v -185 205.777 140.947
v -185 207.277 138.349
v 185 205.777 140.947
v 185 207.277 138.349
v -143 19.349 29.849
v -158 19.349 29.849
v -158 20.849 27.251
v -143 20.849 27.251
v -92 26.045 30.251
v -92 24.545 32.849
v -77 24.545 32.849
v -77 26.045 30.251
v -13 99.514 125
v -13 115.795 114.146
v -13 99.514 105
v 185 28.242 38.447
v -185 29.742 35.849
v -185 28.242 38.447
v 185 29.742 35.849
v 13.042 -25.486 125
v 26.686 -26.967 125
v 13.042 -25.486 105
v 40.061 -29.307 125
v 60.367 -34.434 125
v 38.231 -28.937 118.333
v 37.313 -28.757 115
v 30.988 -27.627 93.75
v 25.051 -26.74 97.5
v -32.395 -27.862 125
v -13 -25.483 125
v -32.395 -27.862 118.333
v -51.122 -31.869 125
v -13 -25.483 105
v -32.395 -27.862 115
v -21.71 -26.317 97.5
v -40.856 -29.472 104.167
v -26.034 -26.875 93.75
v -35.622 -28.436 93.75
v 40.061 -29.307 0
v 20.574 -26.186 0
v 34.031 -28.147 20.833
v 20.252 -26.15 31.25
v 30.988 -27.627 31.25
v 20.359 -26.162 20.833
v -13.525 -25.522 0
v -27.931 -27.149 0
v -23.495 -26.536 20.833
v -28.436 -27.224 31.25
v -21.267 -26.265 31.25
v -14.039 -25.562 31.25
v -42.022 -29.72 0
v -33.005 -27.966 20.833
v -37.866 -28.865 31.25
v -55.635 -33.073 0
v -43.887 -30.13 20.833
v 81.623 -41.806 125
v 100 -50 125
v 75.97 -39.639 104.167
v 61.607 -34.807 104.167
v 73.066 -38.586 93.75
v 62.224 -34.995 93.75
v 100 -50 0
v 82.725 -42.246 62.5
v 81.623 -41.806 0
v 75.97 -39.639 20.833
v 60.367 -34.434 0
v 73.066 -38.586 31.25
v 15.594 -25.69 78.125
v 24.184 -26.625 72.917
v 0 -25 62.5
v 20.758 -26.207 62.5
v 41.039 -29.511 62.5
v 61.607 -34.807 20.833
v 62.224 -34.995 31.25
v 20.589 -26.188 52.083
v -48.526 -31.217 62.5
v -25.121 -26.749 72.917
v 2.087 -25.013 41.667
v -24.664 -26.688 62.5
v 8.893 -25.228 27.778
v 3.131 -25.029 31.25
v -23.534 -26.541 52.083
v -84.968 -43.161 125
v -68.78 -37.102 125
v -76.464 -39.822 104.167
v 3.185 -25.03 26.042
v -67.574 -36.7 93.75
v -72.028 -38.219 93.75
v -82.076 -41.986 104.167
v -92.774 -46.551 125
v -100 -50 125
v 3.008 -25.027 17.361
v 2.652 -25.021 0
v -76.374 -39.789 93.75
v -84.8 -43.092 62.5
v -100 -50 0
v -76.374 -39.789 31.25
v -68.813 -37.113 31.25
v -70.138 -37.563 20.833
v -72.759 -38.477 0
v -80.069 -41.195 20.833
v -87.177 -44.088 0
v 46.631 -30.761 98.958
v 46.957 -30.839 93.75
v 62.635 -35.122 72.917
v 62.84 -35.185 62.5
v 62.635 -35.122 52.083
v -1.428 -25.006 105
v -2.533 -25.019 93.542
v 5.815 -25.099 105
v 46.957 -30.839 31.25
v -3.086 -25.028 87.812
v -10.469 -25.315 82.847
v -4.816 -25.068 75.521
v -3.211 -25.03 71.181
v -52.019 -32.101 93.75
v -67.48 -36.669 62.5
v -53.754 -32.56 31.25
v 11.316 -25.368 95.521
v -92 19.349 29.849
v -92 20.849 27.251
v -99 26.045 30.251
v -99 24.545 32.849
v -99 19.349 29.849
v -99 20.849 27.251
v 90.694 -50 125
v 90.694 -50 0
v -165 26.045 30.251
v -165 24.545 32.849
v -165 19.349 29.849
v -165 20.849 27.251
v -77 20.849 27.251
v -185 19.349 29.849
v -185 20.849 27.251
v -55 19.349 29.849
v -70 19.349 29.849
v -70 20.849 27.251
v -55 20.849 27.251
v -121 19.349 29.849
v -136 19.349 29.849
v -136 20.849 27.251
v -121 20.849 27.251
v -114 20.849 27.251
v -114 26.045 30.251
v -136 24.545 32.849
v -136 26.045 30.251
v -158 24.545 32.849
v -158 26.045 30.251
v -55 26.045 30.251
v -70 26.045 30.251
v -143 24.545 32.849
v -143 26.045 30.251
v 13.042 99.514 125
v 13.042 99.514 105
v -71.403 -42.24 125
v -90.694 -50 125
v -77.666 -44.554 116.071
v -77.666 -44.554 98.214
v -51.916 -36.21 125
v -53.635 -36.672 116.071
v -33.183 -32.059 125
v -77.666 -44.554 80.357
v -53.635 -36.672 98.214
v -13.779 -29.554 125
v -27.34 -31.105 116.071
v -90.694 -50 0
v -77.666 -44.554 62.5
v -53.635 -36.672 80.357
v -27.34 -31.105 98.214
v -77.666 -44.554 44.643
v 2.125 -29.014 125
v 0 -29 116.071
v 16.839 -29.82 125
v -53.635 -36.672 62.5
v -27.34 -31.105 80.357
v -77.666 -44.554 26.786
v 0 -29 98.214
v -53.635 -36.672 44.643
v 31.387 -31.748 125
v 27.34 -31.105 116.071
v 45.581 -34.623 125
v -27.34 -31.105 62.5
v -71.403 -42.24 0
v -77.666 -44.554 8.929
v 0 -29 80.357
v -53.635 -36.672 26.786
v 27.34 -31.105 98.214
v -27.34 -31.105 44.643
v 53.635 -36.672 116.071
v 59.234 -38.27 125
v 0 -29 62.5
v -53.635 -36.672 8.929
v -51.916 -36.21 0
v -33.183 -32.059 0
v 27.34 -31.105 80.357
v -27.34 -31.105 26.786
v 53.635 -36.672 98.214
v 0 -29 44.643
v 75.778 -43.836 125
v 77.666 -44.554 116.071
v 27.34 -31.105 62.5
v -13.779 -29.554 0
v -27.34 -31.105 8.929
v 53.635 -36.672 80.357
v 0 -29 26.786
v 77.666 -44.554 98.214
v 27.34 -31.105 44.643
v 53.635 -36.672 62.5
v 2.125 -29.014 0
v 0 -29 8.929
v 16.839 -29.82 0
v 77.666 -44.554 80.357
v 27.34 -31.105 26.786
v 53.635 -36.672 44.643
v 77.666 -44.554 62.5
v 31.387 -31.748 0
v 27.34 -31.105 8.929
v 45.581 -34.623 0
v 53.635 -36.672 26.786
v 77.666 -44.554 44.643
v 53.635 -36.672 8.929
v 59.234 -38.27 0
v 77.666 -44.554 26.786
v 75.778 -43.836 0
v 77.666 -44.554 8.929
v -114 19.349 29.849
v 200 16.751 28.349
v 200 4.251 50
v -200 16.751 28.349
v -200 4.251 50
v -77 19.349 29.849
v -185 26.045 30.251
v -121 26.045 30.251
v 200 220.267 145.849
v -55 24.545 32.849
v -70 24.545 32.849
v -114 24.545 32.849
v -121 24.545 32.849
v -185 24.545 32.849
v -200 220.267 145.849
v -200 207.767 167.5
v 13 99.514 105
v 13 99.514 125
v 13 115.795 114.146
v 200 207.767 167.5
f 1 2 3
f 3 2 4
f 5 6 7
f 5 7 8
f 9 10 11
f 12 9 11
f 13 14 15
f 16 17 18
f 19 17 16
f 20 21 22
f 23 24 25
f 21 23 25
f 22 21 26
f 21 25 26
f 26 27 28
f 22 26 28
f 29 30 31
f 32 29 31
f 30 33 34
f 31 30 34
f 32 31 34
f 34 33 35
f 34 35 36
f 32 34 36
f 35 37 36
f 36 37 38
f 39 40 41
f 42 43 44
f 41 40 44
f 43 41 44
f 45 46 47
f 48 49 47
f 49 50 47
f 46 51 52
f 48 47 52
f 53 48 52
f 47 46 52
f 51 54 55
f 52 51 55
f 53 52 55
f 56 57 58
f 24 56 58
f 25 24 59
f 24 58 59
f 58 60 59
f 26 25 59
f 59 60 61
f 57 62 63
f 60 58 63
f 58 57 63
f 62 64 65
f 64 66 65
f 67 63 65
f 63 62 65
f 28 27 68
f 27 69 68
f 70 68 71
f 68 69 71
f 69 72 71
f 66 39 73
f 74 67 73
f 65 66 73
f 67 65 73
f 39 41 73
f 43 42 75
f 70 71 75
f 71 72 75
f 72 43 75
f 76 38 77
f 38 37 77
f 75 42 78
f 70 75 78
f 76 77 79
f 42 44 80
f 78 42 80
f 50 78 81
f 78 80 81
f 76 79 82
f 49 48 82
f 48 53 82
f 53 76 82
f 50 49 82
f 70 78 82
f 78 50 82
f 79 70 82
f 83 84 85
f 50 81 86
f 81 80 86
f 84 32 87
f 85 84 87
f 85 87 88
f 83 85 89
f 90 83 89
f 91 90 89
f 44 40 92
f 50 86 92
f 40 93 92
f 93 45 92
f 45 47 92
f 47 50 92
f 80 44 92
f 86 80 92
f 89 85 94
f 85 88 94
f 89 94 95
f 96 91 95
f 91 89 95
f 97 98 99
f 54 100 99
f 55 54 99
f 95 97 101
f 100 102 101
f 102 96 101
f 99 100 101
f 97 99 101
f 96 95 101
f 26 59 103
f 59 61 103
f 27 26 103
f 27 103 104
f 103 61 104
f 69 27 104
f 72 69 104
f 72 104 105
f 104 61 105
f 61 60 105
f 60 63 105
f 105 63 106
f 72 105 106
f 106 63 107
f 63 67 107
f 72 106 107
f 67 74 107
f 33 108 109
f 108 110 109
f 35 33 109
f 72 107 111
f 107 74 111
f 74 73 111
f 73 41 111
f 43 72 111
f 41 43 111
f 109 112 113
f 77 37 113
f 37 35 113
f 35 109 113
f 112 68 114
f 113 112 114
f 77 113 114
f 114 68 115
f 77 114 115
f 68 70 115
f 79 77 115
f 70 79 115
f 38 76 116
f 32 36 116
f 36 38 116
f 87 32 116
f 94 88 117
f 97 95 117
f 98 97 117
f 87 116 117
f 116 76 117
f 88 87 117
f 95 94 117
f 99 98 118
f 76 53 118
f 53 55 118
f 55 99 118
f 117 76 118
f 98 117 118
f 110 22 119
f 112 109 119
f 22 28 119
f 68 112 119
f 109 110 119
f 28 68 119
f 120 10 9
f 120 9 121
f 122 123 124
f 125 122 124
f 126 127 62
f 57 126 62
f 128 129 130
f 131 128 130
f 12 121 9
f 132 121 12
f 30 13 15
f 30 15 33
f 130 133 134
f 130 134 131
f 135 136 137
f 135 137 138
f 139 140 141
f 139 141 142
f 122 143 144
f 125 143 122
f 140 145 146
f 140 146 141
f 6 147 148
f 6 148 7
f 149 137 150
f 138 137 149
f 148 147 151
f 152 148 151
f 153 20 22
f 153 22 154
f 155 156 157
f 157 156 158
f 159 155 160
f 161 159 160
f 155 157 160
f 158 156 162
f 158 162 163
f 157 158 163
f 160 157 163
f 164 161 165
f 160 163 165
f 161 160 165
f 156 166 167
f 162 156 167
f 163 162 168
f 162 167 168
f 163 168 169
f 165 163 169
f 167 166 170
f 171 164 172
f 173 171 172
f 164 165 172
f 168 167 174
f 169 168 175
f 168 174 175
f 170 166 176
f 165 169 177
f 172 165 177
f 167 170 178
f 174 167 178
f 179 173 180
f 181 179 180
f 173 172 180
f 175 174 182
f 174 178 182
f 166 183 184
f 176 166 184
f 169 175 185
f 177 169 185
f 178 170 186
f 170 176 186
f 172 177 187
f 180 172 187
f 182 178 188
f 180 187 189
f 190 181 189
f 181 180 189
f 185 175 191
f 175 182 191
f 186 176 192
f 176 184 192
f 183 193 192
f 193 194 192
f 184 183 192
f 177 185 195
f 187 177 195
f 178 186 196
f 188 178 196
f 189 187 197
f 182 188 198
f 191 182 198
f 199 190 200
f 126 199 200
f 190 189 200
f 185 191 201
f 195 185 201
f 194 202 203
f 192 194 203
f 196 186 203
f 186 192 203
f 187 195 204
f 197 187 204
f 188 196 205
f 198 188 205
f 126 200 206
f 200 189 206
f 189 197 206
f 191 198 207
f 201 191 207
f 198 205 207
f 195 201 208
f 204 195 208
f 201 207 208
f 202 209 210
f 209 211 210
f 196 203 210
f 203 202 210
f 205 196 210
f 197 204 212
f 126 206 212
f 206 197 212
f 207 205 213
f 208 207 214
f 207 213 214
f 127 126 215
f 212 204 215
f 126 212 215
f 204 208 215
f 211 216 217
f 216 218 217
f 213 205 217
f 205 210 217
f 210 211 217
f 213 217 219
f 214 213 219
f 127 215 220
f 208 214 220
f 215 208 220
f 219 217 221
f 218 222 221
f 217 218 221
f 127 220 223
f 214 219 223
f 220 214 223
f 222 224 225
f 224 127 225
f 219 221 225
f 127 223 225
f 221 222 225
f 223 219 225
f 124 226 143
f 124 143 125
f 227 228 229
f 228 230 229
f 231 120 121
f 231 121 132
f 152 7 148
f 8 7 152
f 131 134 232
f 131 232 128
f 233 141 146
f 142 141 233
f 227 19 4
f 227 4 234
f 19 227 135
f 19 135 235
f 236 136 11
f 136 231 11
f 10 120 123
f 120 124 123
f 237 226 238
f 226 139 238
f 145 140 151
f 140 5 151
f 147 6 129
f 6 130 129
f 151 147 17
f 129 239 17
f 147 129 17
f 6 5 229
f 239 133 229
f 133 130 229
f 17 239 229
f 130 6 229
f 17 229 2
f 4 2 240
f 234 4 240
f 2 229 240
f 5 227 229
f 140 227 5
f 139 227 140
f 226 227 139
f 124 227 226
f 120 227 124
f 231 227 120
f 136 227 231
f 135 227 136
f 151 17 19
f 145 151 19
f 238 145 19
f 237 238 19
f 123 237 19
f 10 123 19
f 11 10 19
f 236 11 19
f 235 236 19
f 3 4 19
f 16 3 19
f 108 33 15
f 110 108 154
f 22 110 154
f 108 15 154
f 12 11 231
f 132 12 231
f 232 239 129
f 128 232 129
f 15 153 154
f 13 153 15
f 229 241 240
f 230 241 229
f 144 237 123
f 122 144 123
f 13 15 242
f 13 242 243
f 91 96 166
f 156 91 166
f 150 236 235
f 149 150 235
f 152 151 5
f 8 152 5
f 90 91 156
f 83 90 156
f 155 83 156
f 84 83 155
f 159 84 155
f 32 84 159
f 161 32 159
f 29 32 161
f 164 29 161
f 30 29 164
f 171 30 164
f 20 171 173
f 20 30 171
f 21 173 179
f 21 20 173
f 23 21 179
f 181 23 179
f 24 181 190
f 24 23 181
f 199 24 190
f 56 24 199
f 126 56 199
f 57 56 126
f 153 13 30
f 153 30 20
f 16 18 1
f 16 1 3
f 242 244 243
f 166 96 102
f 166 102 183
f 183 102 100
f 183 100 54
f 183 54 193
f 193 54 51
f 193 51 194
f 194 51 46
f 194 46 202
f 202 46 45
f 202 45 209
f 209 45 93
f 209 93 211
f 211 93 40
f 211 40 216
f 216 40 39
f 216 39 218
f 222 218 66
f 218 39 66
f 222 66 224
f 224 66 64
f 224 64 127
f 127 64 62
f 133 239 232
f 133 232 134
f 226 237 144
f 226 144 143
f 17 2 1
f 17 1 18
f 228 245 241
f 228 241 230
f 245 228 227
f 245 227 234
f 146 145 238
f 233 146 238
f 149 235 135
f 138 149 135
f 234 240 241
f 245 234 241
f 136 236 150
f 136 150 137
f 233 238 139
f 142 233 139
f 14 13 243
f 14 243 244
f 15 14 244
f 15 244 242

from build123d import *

# Parameters (mm, degrees)
F1_DEPTH  = 125
F3_DEPTH  = 20
F5_DEPTH  = 187
F7_DEPTH  = 213
F8_W      = 370
F8_H      = 205
F9_DEPTH  = 3
F10_W     = 15
F10_H     = 6
F10_W_2   = 20
F11_DEPTH = 3
F13_DEPTH = 26


# Not quite as in the source:
# - ends of sketch curves that miss each other by under 0.0002 mm in the source are joined
# - the dataset's text gives a spline's control points without its knots; the knots are read off the source's solid


with BuildPart() as f1:
    # F0 (on Top) → F1 (new body)
    with BuildSketch(Plane.XY):
        with BuildLine():
            Line((0, -29), (0, -25))
            add(Edge.make_bspline(
                [(-100, -50), (-75, -37.5), (-37.5, -25), (0, -25)],
                knots=[0, 0, 0, 0, 0.5, 0.5, 0.5, 0.5], degree=3))
            Line((-100, -50), (-90.6944093778, -50))
            add(Edge.make_bspline(
                [(-90.6944093778, -50), (-86.5987449165, -48.1438234757), (-75.0967566586, -43.3127738232), (-58.0512990615, -37.6313364396), (-40.7635580102, -33.4057717813), (-27.3839101667, -30.9603889359), (-16.0168642352, -29.6446162761), (-6.8676046006, -29.0953479652), (-2.2892015335, -29), (0, -29)],
                knots=[0.0487321749, 0.0487321749, 0.0487321749, 0.0487321749, 0.125, 0.25, 0.3125, 0.375, 0.4375, 0.46875, 0.5, 0.5, 0.5, 0.5], degree=3))
        make_face()
        with BuildLine():
            add(Edge.make_bspline(
                [(0, -25), (37.5, -25), (75, -37.5), (100, -50)],
                knots=[0.5, 0.5, 0.5, 0.5, 1, 1, 1, 1], degree=3))
            Line((0, -25), (0, -29))
            add(Edge.make_bspline(
                [(0, -29), (2.2892015335, -29), (6.8676046006, -29.0953479652), (16.0168642352, -29.6446162761), (27.3839101667, -30.9603889359), (40.7635580102, -33.4057717813), (58.0512990615, -37.6313364396), (75.0967566586, -43.3127738232), (86.5987449165, -48.1438234757), (90.6944093778, -50.0000690471)],
                knots=[0.5, 0.5, 0.5, 0.5, 0.53125, 0.5625, 0.625, 0.6875, 0.75, 0.875, 0.9512678251, 0.9512678251, 0.9512678251, 0.9512678251], degree=3))
            Line((90.6944093778, -50.0000690471), (100, -50))
        make_face()
    extrude(amount=F1_DEPTH)

    # F2 (on face) → F3 (join)
    with BuildSketch(Plane.XY.offset(125)):
        with BuildLine():
            Line((-13, 0), (0, 0))
            Line((0, 0), (0, -25))
            add(Edge.make_bspline(
                [(13.0421580745, -25.4859430767), (8.7078145989, -25.1685023002), (4.3539072994, -25), (0, -25)],
                knots=[0.9419479027, 0.9419479027, 0.9419479027, 0.9419479027, 1, 1, 1, 1], degree=3))
            Line((13.0421580745, -25.4859430767), (13.0421580745, 0.5756272936))
            Line((13.0421580745, 0.5756272936), (13.0421580745, 99.5140569233))
            Line((13.0421580745, 99.5140569233), (-13, 99.5140569233))
            Line((-13, 99.5140569233), (-13, 0))
        make_face()
        with BuildLine():
            Line((0, -25), (0, 0))
            Line((0, 0), (-13, 0))
            Line((-13, 0), (-13, -25.4828602254))
            add(Edge.make_bspline(
                [(0, -25), (-4.339791385, -25), (-8.67958277, -25.1674114601), (-13, -25.4828602254)],
                knots=[1, 1, 1, 1, 1.0578638851, 1.0578638851, 1.0578638851, 1.0578638851], degree=3))
        make_face()
    extrude(amount=-F3_DEPTH)


with BuildPart() as f5:
    # F4 (on face) → F5 (new body)
    with BuildSketch(Plane(origin=(-13, 0, 0), x_dir=(0, -1, 0), z_dir=(-1, 0, 0))):
        Polygon((-4.251262507, 50), (-99.5140569233, 105), (-207.7672323963, 167.5), (-220.2672323963, 145.8493649054), (-16.751262507, 28.3493649054), align=None)
    extrude(amount=F5_DEPTH)

    # F6 (on face) → F7 (join)
    with BuildSketch(Plane.YZ.offset(-13)):
        Polygon((220.2672323963, 145.8493649054), (207.7672323963, 167.5), (4.251262507, 50), (16.751262507, 28.3493649054), align=None)
    extrude(amount=F7_DEPTH)

    # F8 (on face) → F9 (cut)
    with BuildSketch(Plane(origin=(0, -8.0878194679, 14.0085142408), x_dir=(1, 0, 0), z_dir=(0, 0.5, -0.8660254038))):
        with Locations((0, -146.1817013292)):
            Rectangle(F8_W, F8_H)
    extrude(amount=-F9_DEPTH, mode=Mode.SUBTRACT)

    # F10 (on face) → F11 (join)
    with BuildSketch(Plane(origin=(0, -8.0878194679, 14.0085142408), x_dir=(1, 0, 0), z_dir=(0, 0.5, -0.8660254038))):
        with Locations((-62.5, -34.6817013292)):
            Rectangle(F10_W, F10_H)
        with Locations((-84.5, -34.6817013292)):
            Rectangle(F10_W, F10_H)
        with Locations((-106.5, -34.6817013292)):
            Rectangle(F10_W, F10_H)
        with Locations((-128.5, -34.6817013292)):
            Rectangle(F10_W, F10_H)
        with Locations((-150.5, -34.6817013292)):
            Rectangle(F10_W, F10_H)
        with Locations((-175, -34.6817013292)):
            Rectangle(F10_W_2, F10_H)
    extrude(amount=F11_DEPTH)


with BuildPart() as f13:
    # F12 (on face) → F13 (new body)
    with BuildSketch(Plane(origin=(-13, 0, 0), x_dir=(0, -1, 0), z_dir=(-1, 0, 0))):
        Polygon((-99.5140569233, 105), (-99.5140569233, 125), (-115.7948323081, 114.1461497434), align=None)
    extrude(amount=-F13_DEPTH)


solid = Compound([f1.part, f5.part, f13.part])
